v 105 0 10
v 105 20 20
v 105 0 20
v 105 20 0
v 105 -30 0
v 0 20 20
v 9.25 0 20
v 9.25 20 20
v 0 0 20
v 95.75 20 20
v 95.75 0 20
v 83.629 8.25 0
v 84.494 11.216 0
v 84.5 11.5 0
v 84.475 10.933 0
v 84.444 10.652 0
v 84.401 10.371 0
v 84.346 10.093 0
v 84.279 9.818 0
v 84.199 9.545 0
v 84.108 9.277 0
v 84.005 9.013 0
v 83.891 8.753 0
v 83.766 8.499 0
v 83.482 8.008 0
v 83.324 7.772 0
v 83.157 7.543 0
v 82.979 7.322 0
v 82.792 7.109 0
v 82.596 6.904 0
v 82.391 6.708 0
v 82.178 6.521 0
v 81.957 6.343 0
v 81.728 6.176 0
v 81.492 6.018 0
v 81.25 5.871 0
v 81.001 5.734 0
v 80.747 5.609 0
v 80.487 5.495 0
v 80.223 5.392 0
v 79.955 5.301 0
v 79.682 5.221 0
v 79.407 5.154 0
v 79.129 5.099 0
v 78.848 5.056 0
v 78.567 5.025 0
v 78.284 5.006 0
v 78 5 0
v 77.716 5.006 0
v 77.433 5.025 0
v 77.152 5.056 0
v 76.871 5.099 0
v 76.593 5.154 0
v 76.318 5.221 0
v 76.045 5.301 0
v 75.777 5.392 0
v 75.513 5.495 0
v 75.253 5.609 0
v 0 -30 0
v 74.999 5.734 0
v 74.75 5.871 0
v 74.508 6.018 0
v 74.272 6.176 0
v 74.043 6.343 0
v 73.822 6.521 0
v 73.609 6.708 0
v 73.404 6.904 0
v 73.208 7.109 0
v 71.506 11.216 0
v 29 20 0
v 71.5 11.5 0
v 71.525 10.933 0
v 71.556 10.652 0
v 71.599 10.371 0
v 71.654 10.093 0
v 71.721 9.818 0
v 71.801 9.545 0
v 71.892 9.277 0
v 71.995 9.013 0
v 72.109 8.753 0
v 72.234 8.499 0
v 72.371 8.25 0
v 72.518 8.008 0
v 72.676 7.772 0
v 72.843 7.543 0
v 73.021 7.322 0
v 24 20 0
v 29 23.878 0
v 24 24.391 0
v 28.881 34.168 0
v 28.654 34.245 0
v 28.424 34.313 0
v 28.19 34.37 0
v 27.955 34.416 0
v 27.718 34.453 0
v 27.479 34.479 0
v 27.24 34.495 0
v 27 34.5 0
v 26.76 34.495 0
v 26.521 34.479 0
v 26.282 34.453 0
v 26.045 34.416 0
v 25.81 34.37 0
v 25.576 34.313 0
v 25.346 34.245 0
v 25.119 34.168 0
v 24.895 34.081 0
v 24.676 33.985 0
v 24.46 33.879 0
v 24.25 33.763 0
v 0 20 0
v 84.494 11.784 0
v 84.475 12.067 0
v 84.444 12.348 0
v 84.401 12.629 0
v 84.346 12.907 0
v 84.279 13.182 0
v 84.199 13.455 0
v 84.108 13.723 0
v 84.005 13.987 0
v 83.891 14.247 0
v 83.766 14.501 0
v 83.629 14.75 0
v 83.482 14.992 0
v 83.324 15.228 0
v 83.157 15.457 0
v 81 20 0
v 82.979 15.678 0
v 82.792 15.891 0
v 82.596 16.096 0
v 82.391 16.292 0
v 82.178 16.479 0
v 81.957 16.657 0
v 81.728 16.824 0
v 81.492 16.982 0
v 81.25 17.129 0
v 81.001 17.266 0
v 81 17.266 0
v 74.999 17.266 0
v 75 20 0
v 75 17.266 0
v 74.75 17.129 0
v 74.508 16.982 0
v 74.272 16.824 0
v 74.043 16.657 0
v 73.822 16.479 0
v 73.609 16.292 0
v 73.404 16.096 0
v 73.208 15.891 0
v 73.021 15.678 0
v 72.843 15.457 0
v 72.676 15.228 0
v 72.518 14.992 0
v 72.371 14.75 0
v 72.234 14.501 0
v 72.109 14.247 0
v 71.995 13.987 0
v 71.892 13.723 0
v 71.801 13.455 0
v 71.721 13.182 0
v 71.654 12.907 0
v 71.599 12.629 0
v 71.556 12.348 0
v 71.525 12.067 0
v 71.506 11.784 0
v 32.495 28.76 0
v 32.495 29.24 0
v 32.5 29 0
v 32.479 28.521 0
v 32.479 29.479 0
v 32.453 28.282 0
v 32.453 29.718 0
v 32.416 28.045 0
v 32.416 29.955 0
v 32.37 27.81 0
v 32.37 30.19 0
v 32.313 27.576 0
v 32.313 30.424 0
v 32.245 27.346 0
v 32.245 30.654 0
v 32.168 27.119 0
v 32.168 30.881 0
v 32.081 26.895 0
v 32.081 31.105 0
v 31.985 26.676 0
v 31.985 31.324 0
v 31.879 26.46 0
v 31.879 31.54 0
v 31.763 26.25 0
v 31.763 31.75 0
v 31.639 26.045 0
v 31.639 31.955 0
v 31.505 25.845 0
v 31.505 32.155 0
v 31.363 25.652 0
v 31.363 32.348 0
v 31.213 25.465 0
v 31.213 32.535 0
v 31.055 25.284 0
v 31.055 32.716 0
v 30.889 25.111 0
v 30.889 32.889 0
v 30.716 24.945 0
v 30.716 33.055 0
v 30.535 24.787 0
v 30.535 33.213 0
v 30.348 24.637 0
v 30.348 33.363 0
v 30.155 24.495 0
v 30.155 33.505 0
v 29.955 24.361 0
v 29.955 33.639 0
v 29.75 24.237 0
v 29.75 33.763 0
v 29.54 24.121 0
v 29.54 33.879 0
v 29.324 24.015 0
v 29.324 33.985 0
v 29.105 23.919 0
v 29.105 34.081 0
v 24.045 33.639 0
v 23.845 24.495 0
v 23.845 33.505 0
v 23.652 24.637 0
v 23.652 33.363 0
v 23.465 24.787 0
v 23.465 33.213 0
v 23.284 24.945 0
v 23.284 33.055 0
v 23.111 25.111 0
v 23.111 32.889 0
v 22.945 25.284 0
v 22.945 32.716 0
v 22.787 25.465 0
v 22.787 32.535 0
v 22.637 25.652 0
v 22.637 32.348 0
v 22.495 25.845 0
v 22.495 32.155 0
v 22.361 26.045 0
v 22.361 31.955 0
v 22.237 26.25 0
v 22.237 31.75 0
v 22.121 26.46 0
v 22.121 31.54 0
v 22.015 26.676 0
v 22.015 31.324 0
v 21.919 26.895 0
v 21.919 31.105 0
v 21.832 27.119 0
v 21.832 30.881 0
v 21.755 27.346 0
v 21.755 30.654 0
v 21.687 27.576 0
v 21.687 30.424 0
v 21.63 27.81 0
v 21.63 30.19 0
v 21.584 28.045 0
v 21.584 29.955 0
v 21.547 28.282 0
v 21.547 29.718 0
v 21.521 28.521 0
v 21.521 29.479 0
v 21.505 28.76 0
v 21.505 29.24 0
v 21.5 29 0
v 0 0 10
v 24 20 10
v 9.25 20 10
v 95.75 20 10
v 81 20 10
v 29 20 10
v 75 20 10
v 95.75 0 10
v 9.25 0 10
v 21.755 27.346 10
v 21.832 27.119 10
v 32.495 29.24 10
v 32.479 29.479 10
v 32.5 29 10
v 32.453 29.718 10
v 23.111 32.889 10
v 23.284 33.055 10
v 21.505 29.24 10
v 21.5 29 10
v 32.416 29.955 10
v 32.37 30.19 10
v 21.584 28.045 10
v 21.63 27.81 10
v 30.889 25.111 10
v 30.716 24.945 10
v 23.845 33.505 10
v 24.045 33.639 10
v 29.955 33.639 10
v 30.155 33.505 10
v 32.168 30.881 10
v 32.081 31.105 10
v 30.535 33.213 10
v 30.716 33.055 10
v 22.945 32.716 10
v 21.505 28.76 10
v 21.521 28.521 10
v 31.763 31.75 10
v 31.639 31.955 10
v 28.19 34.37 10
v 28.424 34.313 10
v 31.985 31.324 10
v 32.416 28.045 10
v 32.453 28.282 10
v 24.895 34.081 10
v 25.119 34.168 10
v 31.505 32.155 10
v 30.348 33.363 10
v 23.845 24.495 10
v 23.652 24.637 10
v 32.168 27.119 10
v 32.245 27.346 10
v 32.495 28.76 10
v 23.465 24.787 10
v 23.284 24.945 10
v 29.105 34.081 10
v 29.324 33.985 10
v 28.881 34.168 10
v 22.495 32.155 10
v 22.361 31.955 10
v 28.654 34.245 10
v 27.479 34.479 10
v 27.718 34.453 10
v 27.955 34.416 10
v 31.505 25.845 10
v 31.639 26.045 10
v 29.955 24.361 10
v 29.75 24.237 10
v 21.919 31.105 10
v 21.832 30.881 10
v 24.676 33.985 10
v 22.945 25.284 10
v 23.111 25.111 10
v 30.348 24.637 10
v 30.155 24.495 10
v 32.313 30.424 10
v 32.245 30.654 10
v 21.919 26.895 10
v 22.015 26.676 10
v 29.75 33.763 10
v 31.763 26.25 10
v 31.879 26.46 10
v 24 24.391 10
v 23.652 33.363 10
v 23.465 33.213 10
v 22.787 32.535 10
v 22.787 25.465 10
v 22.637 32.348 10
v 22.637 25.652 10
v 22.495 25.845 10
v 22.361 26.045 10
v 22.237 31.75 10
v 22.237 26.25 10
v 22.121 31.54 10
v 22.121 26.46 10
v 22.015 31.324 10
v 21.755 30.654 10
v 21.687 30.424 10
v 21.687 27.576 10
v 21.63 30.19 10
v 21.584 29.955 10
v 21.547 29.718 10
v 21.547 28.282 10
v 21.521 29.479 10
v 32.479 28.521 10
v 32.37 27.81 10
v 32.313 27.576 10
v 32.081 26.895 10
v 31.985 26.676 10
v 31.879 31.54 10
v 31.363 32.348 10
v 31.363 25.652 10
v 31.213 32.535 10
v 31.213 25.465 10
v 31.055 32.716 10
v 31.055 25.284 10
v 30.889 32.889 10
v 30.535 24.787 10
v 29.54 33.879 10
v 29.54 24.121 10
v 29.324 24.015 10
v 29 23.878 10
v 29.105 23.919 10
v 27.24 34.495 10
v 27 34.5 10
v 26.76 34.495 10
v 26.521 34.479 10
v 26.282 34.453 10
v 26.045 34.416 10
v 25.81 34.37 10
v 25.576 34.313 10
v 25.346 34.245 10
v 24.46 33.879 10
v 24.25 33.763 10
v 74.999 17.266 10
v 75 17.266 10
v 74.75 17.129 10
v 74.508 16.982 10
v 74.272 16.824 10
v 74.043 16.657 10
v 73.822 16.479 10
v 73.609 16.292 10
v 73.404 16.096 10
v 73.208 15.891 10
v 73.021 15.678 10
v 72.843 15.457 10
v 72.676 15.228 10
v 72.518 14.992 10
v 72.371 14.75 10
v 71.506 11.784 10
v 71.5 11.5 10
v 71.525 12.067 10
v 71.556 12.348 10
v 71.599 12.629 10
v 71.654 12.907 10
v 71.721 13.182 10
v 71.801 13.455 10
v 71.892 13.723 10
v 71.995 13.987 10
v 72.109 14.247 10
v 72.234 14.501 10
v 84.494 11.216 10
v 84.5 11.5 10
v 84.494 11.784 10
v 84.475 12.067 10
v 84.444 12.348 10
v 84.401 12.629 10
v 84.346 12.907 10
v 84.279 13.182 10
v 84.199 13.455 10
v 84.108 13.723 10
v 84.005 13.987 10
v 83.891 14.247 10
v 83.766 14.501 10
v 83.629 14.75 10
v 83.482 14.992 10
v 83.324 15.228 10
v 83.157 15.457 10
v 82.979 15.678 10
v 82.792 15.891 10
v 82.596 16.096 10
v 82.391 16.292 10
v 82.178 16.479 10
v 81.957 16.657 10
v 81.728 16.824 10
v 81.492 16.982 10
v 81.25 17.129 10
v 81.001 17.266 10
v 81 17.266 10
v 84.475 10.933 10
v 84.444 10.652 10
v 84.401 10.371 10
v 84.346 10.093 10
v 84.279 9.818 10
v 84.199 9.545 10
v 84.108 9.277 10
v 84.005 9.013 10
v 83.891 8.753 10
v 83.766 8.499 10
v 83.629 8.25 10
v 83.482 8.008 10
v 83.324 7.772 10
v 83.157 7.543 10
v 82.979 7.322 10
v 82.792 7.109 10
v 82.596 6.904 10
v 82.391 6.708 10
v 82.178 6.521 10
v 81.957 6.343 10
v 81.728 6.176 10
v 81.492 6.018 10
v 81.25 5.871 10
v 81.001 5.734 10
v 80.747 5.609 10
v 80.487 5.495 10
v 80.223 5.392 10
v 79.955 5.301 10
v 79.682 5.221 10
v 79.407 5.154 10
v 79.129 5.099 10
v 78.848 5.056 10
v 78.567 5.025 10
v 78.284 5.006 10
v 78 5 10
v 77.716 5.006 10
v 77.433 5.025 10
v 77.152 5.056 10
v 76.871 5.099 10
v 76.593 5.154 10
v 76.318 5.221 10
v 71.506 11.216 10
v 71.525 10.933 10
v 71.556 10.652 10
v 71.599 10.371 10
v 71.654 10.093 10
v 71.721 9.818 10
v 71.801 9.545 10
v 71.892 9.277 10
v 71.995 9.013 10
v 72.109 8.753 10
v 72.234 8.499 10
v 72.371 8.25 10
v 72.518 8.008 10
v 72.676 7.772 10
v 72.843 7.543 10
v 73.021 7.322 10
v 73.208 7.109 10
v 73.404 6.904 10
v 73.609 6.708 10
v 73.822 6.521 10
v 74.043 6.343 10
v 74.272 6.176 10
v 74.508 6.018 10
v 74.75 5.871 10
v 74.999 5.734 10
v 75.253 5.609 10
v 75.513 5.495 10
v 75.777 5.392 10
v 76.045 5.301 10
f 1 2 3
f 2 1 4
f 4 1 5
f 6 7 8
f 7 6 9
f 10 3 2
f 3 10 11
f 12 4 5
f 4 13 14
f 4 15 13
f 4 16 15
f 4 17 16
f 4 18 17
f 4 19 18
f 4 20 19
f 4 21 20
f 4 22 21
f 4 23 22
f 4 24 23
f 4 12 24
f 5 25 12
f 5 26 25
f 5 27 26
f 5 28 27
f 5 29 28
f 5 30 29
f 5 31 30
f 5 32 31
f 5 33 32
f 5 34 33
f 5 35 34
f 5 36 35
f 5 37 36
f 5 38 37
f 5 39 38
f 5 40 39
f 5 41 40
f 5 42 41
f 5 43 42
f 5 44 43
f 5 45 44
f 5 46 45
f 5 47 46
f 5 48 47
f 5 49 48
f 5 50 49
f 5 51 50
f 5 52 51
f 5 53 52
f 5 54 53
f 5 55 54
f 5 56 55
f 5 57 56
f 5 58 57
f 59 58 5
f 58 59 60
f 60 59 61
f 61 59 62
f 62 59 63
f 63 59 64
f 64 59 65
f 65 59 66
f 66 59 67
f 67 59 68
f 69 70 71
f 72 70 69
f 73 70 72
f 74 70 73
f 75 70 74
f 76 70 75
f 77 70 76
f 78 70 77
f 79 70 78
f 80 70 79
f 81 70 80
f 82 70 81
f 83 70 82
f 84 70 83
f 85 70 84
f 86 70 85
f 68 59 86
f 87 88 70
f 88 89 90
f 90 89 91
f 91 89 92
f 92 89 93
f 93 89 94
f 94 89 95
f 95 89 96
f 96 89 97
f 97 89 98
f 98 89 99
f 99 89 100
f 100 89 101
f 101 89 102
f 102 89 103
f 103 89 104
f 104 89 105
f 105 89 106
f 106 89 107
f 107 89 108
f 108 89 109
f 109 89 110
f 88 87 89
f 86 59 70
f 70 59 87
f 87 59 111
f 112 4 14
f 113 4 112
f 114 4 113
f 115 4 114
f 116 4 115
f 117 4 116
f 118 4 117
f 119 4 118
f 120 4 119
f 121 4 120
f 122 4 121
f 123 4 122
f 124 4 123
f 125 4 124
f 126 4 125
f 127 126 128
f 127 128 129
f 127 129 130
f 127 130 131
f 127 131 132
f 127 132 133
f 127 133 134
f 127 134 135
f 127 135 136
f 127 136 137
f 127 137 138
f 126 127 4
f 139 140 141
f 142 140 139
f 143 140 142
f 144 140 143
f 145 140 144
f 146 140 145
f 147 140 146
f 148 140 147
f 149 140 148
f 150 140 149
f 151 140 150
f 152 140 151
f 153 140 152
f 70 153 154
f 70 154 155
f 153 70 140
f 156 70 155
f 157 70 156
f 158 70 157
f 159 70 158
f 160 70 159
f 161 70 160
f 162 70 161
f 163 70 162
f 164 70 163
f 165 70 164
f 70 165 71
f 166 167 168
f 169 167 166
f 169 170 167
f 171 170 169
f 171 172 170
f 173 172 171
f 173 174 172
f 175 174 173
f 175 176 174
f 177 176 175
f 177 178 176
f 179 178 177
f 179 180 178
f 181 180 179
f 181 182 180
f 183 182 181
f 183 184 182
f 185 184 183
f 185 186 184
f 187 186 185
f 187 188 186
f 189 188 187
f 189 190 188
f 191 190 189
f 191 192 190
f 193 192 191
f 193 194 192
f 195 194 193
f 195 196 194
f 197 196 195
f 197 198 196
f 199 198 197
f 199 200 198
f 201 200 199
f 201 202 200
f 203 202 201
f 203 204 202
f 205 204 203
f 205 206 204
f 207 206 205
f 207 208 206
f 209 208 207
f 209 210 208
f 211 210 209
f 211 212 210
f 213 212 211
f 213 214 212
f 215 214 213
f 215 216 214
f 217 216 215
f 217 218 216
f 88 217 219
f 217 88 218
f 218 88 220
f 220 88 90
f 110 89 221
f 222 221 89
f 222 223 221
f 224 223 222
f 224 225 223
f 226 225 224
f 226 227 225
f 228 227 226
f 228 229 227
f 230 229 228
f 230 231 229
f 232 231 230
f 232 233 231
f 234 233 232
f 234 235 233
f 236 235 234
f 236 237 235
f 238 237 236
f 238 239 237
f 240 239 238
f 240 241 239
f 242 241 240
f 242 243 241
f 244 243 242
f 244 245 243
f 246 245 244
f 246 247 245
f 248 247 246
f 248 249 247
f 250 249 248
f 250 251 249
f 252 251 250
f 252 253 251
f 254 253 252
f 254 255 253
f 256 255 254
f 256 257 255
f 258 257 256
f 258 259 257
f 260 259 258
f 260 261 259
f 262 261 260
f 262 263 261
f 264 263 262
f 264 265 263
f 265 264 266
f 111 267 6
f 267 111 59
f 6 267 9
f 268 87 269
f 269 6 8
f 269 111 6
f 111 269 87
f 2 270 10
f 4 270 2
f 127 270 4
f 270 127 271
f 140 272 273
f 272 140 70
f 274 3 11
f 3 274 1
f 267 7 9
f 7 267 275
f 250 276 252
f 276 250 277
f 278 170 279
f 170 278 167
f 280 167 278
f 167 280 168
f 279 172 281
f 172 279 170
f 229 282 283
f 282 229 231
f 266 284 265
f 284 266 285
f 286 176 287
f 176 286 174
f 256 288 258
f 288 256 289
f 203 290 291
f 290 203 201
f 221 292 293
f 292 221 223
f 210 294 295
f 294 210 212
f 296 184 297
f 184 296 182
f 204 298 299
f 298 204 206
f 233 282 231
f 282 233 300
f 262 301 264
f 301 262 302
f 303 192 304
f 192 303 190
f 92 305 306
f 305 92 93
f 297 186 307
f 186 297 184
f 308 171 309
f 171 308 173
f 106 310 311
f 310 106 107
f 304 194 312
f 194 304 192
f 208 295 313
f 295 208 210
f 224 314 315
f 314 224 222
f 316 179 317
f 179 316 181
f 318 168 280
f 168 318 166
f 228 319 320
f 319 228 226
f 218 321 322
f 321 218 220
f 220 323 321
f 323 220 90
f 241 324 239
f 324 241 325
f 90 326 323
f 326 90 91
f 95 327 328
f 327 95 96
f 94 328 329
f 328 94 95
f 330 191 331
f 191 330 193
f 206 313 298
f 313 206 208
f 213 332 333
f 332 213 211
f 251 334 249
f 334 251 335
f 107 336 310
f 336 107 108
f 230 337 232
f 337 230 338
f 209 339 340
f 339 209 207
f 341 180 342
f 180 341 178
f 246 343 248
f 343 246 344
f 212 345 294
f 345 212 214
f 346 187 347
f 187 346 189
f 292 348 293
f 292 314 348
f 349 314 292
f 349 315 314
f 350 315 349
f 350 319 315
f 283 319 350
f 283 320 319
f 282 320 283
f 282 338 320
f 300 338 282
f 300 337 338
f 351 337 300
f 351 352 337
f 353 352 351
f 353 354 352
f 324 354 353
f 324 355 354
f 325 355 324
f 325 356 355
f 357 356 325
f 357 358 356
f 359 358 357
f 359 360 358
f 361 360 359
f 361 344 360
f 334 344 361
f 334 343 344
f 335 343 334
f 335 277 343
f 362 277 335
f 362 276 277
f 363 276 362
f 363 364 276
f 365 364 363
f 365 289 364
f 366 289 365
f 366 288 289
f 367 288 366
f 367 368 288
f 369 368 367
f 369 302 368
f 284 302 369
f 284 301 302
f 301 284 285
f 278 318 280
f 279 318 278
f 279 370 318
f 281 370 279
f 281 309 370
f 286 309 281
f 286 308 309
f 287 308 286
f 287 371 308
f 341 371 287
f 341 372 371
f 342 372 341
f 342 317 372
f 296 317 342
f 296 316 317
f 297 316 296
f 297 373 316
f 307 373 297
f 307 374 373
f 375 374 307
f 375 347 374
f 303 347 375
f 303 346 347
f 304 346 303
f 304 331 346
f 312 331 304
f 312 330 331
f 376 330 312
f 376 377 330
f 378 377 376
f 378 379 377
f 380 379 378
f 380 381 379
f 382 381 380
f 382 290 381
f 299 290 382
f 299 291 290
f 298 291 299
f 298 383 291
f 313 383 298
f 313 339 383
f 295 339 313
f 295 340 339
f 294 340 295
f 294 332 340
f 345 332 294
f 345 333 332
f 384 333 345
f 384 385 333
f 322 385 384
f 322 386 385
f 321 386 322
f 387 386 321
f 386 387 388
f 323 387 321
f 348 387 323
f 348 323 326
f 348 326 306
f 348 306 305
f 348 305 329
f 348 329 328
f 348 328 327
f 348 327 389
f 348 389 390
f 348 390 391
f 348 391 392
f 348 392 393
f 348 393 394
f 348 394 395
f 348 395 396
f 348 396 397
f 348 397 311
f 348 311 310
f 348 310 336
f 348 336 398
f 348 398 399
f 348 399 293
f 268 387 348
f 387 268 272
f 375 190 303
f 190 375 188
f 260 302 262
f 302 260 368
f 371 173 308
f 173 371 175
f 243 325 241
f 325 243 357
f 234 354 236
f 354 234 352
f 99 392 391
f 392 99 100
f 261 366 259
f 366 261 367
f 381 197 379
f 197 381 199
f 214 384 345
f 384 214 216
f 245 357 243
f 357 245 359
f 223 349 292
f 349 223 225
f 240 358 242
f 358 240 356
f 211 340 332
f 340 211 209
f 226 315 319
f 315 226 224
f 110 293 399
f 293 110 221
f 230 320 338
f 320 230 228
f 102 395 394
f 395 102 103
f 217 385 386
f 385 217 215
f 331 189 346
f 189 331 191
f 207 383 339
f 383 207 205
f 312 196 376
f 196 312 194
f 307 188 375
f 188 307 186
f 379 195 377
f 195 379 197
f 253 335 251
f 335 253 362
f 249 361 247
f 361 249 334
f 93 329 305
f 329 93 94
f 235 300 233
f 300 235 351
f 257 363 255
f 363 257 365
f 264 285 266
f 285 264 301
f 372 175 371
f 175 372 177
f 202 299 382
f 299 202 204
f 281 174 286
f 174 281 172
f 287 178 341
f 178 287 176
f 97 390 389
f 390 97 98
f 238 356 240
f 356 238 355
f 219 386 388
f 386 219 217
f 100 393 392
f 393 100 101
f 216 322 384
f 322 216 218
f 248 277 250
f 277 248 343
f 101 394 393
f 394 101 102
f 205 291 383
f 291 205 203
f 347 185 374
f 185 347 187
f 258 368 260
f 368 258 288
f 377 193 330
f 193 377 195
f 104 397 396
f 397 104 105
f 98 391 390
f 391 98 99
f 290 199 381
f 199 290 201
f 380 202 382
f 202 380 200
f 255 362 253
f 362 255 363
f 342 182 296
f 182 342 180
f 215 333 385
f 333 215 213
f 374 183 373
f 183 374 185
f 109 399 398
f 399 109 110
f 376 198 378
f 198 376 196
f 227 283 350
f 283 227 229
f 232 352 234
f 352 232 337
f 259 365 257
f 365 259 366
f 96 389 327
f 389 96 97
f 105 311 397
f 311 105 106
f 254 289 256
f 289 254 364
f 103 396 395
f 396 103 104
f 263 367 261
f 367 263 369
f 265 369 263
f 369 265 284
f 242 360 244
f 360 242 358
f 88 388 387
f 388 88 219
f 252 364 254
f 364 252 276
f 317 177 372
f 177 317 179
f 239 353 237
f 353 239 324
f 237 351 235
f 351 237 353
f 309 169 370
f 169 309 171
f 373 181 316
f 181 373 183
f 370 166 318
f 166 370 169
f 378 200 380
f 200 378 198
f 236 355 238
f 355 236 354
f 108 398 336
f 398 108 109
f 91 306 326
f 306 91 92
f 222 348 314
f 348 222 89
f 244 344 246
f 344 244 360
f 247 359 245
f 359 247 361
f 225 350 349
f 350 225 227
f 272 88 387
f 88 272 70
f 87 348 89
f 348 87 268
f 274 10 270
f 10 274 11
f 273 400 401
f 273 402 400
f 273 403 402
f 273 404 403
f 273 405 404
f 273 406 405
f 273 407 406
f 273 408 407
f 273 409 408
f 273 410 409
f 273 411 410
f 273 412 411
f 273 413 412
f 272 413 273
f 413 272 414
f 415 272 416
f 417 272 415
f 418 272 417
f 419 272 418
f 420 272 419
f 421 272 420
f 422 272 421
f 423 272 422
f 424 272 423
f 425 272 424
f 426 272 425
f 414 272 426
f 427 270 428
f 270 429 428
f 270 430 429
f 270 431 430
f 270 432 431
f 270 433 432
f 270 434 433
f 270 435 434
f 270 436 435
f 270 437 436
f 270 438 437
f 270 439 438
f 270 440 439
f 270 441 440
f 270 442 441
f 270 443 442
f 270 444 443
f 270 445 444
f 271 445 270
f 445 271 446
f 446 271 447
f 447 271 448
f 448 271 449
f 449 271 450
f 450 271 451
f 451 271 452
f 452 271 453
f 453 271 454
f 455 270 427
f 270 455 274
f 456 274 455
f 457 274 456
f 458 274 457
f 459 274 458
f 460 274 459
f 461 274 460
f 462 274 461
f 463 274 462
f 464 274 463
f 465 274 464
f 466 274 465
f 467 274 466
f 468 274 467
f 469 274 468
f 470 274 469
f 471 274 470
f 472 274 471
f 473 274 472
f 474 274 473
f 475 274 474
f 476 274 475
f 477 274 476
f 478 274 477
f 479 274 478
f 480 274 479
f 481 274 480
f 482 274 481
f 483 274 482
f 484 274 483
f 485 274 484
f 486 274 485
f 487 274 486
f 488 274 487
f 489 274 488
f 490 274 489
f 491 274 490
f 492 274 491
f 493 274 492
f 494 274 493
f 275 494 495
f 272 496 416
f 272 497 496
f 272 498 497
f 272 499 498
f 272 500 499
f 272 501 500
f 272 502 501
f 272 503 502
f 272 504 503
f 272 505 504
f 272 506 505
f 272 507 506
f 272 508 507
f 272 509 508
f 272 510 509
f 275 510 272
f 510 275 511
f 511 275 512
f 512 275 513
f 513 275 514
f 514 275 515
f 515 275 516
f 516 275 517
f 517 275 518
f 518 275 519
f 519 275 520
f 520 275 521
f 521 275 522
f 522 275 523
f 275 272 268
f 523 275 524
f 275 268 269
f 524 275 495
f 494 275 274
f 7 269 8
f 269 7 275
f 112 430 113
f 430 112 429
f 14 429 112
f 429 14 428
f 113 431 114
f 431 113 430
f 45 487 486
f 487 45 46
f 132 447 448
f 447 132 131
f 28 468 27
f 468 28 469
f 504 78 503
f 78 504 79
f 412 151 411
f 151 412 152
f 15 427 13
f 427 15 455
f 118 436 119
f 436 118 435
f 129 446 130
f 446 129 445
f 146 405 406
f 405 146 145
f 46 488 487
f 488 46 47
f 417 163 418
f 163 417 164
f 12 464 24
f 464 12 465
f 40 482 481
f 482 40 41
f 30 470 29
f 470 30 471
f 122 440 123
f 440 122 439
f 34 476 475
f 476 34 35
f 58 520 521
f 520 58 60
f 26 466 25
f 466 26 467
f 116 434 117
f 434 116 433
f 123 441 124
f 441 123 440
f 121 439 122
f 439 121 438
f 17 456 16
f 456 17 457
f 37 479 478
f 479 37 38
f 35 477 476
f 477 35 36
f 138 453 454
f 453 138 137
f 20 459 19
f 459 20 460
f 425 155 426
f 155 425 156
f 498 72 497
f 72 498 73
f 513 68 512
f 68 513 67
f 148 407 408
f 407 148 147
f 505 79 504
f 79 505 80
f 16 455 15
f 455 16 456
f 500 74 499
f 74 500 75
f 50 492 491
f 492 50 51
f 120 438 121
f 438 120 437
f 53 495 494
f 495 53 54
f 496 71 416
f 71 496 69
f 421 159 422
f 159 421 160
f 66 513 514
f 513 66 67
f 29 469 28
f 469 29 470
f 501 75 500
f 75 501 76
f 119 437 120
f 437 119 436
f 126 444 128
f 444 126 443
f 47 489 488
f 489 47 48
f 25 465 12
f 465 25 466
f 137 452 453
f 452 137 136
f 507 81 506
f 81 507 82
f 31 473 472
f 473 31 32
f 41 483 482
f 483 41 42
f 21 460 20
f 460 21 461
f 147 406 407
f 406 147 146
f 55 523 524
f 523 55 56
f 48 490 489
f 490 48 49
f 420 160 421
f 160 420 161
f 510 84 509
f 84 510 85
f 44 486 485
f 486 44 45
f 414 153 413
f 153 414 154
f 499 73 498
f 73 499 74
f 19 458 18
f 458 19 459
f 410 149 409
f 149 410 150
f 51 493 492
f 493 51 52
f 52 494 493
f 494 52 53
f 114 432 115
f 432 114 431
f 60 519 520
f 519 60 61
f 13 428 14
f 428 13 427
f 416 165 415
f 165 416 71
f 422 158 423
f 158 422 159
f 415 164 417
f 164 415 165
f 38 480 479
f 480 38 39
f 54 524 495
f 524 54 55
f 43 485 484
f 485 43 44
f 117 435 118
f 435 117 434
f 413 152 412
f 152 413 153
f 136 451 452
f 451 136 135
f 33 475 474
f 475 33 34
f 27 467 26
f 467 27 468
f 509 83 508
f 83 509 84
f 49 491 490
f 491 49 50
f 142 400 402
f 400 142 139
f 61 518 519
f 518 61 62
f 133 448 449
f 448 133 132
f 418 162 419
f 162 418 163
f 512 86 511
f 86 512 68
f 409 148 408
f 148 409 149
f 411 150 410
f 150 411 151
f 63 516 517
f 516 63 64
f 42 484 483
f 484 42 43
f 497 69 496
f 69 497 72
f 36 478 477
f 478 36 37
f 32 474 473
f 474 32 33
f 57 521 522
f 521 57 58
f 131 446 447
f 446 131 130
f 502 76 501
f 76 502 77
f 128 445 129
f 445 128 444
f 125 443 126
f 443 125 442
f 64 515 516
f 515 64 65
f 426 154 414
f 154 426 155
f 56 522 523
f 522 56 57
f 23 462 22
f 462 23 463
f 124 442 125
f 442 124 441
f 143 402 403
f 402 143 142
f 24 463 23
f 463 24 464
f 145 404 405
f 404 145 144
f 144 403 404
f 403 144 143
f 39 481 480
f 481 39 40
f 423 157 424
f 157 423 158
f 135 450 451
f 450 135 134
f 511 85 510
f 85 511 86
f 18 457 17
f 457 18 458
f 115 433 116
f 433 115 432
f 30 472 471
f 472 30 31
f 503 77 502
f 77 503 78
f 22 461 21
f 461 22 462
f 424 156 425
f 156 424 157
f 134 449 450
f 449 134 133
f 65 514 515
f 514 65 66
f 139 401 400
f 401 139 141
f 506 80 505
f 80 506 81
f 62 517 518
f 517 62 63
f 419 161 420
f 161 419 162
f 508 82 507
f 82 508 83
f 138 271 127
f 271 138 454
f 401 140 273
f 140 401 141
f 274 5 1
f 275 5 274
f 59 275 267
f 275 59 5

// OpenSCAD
//Wader

lengteweg = 20;

breed = 105;
breedteweg=86.5;
hoogte = 20;
hoogteweg=10;

cilinderbev=11; 
cilinderbevgat=13;

diktebev=5; // gat=7
diktebevgat=6;
lengtebev=18; // gat=15
plekbev=27; // vanaf buitenrand


difference()
 {
     union()
    {
     cube([breed,lengteweg,hoogte]);
    
    translate([plekbev,lengteweg+(lengtebev)/2,0])
    cylinder(r=(cilinderbev)/2,h=hoogteweg,$fn=144);
    
     translate([plekbev-diktebevgat/2,(lengteweg),0])
     cube([diktebev,5,hoogteweg]); 
        
   

   
    }
     union()
    {
     translate([(breed-breedteweg)/2,0,hoogteweg])
     cube([breedteweg,lengteweg,hoogteweg]);
     
     translate([breed-plekbev,lengteweg-(lengtebev-1)/2,0])
    cylinder(r=(cilinderbevgat)/2,h=hoogte,$fn=144);
        
     translate([breed-plekbev-diktebevgat/2,(lengteweg-3),0])
       cube([diktebevgat,3,hoogteweg]); 
        
   
   

    }
 }
 
    
  module prism(l, w, h){
       polyhedron(
               points=[[0,0,0], [l,0,0], [l,w,0], [0,w,0], [0,w,h], [l,w,h]],
               faces=[[0,1,2,3],[5,4,3,2],[0,4,5,1],[0,3,4],[5,2,1]]
               );
       }
   
   translate([0,-30,0])    
   prism(breed,  30,hoogteweg);
